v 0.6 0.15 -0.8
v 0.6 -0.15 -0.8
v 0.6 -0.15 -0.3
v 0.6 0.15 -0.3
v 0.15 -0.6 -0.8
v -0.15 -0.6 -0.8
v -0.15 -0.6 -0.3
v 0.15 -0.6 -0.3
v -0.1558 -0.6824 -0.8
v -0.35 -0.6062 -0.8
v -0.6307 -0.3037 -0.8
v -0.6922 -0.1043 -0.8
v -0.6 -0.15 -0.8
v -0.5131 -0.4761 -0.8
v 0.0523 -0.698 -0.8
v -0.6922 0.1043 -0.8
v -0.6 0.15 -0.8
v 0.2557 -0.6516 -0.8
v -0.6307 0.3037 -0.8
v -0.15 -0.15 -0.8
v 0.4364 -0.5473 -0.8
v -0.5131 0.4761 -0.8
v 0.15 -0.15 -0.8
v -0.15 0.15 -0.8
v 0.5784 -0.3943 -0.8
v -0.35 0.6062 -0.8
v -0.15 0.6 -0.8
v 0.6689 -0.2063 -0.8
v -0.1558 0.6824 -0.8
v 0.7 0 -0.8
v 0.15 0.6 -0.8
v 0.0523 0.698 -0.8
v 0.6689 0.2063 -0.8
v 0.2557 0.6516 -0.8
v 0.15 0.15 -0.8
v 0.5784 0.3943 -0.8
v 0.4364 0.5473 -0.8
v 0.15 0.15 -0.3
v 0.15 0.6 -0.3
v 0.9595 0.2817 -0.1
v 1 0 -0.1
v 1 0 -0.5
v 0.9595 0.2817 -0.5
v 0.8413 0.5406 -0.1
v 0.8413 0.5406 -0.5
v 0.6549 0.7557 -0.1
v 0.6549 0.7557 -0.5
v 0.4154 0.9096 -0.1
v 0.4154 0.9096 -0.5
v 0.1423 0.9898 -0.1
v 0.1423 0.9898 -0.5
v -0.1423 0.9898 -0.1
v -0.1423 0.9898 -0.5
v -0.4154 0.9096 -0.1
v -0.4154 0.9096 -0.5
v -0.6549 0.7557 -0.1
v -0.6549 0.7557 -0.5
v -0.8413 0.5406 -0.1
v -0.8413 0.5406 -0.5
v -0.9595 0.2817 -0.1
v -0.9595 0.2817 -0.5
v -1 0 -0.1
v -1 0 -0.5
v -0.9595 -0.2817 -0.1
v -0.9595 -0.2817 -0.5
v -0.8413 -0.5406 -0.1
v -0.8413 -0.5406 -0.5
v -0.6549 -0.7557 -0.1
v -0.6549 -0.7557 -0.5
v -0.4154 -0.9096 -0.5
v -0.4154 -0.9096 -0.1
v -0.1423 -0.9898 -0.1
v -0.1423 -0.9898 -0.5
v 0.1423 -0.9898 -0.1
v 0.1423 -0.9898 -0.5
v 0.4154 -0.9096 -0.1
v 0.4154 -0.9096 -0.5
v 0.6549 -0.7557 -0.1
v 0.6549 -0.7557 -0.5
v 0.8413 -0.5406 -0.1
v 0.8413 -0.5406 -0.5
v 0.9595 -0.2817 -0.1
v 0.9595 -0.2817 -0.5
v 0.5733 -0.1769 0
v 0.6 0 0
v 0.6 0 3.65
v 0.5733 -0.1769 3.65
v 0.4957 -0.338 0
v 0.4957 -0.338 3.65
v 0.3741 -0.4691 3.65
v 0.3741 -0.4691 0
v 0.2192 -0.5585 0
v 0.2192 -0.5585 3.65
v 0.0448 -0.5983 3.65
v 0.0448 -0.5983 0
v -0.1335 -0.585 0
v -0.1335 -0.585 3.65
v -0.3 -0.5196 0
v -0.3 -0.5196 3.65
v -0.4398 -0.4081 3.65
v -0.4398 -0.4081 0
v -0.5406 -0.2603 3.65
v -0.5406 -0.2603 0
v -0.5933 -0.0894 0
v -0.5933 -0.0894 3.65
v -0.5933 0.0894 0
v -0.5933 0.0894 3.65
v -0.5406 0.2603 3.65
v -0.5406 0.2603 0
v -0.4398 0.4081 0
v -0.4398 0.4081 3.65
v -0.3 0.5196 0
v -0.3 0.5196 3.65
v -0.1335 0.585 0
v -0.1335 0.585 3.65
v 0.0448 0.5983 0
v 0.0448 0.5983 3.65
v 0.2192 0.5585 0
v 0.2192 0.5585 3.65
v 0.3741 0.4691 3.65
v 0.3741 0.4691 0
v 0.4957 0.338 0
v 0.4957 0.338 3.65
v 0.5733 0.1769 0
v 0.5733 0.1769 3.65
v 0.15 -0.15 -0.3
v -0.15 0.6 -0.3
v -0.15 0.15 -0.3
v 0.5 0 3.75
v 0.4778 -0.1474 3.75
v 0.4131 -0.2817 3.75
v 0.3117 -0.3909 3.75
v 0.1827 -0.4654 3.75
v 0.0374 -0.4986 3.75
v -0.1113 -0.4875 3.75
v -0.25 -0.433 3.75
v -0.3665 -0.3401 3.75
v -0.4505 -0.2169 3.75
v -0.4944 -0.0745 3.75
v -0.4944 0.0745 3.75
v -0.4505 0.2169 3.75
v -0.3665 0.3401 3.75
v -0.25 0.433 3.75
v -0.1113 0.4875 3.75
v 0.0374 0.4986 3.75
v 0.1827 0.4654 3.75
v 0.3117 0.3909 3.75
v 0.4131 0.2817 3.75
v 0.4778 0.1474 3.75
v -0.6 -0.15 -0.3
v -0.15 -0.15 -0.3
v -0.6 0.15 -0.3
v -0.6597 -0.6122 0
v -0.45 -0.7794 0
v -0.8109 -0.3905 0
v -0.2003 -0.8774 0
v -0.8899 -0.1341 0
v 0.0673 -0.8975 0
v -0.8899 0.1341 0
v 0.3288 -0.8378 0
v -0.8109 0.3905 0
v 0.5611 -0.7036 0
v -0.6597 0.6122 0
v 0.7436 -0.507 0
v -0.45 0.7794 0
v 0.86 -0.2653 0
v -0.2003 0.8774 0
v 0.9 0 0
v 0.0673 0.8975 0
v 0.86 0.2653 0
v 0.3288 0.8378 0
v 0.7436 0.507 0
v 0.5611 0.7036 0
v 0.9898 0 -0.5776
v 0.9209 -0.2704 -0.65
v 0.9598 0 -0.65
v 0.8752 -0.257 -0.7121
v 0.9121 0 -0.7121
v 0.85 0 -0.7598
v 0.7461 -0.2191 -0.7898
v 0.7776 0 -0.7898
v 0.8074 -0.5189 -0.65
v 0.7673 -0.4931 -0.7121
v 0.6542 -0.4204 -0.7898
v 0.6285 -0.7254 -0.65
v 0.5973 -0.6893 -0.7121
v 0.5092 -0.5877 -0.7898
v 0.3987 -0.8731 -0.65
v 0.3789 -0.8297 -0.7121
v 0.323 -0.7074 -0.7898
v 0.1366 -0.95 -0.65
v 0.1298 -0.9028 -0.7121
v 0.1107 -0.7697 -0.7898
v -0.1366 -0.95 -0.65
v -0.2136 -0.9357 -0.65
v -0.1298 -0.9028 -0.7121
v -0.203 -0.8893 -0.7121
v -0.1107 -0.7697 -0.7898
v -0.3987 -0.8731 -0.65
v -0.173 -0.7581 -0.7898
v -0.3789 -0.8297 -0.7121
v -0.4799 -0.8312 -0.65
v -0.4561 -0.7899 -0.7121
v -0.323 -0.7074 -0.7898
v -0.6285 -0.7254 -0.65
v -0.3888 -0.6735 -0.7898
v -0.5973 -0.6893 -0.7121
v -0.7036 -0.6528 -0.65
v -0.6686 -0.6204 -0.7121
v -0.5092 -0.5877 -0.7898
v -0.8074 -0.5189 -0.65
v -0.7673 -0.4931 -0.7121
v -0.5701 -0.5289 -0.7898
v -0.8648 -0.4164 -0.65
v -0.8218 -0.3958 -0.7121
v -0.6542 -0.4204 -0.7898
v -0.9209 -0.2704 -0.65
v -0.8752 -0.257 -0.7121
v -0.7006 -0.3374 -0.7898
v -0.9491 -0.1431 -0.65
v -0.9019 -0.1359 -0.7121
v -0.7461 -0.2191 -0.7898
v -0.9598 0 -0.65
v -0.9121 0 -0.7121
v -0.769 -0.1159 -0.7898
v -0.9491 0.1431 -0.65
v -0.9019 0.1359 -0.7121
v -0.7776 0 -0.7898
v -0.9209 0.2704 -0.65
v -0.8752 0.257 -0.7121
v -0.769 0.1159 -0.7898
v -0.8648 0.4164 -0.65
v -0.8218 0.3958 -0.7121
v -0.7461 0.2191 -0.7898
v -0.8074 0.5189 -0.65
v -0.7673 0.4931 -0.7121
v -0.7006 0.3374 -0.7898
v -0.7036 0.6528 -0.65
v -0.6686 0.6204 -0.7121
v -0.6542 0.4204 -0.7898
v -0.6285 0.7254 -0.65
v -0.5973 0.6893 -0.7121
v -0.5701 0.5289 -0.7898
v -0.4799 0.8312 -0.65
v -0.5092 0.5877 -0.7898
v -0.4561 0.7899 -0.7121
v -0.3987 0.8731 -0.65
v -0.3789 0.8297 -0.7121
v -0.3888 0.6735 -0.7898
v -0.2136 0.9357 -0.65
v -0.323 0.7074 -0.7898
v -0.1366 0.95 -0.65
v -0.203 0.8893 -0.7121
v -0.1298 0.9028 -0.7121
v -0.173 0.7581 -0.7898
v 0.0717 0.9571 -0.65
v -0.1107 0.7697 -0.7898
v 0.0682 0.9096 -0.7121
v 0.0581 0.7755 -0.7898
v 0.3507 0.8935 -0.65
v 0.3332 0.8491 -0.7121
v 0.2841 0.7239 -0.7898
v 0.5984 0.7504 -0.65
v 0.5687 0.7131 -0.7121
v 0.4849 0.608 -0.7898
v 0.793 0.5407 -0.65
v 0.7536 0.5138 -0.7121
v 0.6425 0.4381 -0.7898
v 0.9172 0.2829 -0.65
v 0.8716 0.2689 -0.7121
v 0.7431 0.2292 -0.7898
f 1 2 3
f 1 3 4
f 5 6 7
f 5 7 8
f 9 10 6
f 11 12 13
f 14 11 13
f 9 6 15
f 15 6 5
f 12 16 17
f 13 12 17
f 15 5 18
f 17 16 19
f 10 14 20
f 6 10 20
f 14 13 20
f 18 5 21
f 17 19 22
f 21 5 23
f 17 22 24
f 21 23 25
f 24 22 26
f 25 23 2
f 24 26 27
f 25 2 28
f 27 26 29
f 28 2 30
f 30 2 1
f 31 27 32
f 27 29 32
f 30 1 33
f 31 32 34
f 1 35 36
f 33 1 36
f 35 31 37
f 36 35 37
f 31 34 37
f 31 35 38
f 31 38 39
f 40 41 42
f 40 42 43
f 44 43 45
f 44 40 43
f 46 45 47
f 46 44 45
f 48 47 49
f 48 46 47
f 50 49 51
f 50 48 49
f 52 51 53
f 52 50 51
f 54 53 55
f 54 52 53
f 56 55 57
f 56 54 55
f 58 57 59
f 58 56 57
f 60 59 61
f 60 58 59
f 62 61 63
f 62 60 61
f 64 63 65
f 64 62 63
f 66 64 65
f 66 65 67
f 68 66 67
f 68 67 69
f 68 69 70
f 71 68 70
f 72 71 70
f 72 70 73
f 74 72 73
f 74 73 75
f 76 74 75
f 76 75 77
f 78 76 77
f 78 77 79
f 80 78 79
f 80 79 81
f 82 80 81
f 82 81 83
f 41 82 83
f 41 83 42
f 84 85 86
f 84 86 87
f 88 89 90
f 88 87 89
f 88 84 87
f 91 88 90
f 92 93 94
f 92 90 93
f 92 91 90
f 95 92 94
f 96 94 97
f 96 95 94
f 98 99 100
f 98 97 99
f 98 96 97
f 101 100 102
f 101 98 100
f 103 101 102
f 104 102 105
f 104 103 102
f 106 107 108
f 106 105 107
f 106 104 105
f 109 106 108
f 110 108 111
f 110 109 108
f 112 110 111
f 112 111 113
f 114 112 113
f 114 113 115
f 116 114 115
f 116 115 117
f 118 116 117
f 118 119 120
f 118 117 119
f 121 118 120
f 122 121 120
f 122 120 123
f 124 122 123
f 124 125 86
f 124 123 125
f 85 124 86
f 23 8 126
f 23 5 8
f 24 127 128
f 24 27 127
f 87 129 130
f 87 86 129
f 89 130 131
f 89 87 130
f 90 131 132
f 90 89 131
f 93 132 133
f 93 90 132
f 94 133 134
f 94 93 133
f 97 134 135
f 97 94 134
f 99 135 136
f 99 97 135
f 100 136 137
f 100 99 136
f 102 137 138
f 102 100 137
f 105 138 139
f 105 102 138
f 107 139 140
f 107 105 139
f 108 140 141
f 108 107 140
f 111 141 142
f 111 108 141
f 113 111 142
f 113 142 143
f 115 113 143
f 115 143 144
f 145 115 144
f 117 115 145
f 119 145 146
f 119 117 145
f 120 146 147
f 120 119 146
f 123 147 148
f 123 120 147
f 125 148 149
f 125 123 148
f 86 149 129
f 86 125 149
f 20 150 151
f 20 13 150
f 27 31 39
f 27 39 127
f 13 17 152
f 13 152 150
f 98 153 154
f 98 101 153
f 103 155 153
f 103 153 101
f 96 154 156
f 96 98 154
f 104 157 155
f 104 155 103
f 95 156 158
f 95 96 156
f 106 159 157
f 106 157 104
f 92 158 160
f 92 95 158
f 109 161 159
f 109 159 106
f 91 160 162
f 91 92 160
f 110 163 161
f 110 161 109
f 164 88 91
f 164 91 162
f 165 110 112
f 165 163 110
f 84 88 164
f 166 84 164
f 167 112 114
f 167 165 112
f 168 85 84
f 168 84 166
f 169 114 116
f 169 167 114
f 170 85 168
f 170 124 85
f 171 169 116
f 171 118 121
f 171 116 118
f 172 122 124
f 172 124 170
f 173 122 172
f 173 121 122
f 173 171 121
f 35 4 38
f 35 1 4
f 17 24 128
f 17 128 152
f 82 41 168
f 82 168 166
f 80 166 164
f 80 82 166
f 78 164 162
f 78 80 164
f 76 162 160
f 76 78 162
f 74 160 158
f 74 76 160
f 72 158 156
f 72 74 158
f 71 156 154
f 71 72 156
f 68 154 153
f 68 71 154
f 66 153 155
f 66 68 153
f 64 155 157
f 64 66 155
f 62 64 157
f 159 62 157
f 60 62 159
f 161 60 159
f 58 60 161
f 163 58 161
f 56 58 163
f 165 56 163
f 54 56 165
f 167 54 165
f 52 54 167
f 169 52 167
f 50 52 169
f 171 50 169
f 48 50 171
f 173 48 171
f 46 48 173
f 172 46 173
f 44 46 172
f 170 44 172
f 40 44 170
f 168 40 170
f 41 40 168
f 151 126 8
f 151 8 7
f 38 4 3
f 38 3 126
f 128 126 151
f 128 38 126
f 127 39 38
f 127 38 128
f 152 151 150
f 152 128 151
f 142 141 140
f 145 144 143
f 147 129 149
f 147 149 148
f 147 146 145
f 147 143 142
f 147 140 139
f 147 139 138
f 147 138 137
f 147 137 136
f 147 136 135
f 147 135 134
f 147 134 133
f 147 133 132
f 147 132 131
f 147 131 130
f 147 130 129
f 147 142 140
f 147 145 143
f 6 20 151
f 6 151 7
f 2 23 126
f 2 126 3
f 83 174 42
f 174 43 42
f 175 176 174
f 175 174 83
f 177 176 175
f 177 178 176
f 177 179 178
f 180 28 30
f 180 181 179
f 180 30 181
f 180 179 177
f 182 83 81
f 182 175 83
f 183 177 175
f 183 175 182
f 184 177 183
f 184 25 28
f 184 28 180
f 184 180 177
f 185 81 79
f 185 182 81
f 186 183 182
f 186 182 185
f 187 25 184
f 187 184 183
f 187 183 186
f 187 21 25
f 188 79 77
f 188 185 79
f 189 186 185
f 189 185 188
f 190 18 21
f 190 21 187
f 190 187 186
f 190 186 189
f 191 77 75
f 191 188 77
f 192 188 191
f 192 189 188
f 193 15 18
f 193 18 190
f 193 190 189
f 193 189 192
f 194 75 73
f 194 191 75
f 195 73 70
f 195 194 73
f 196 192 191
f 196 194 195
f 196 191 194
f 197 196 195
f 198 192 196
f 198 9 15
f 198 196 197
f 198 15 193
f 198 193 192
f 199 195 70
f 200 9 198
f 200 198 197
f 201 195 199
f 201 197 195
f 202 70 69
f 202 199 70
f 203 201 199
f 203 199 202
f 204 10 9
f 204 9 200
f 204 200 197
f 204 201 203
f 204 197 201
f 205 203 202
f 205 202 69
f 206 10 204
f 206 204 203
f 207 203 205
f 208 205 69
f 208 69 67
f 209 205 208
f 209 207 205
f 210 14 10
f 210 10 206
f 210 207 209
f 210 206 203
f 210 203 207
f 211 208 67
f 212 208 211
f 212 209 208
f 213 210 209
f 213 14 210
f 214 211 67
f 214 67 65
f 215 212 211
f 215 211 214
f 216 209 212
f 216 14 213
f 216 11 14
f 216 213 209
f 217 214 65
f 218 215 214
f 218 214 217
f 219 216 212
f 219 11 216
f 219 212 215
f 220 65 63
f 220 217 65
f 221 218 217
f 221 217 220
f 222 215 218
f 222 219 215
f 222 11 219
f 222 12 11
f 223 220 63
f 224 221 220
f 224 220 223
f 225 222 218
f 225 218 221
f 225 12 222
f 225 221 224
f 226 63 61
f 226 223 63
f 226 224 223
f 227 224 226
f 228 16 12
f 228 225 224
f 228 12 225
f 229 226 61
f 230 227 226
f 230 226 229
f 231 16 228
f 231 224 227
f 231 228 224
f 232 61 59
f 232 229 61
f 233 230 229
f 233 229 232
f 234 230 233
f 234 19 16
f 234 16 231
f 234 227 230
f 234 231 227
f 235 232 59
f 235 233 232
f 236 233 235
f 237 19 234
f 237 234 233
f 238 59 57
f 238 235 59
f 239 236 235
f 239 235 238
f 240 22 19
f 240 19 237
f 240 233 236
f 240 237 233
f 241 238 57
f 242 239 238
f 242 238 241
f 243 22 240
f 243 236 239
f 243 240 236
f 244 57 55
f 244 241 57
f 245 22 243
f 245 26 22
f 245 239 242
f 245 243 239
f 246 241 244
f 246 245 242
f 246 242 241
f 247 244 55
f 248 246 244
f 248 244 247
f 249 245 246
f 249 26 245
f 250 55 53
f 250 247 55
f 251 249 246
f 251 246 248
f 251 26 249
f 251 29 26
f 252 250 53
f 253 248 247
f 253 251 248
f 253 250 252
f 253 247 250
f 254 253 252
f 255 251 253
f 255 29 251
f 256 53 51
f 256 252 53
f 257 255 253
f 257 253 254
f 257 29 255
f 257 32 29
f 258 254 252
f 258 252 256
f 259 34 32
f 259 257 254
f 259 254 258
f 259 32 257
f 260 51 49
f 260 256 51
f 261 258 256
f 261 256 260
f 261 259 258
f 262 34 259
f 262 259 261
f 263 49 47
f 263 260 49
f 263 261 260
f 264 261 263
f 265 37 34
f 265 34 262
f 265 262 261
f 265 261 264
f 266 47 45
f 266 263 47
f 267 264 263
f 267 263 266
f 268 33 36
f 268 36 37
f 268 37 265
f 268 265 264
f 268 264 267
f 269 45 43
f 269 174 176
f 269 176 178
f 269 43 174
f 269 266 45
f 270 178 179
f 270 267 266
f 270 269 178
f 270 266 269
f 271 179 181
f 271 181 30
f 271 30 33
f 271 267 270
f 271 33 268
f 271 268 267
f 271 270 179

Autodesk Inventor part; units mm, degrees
ref_plane "YZ Plane" through (0, 0, 0) normal (1, 0, 0) x (0, 1, 0)
ref_plane "XZ Plane" through (0, 0, 0) normal (0, 1, 0) x (-1, 0, 0)
ref_plane "XY Plane" through (0, 0, 0) normal (0, 0, 1) x (1, 0, 0)
sketch "Sketch1" plane through (0, 0, 0) normal (0, 0, 1) x (1, 0, 0)
  circle A0 centre (0, 0) radius 1
  dimension "d0" = 2
extrude "Extrusion1" add sketch "Sketch1" against normal blind 0.8
sketch "Sketch2" plane through (0, 0, 0) normal (0, 0, 1) x (1, 0, 0)
  circle A0 centre (0, 0) radius 1 projected
  circle A1 centre (0, 0) radius 0.6
  dimension "d3" = 1.2
extrude "Extrusion2" add sketch "Sketch2" along normal blind 3.75 contours A1
fillet "Fillet1" radius 0.3 1 edges at (-1, 0, -0.8)
chamfer "Chamfer1" distance 0.1 angle 45 2 edges at (-1, 0, 0) (-0.6, 0, 3.75)
sketch "Sketch3" plane through (0, 0, -0.8) normal (0, 0, -1) x (-1, 0, 0)
  line L0 (-0.15, 0.15) -> (-0.15, 0.6)
  line L1 (-0.15, 0.6) -> (0.15, 0.6)
  line L2 (0.15, 0.6) -> (0.15, 0.15)
  line L3 (0.15, 0.15) -> (0.6, 0.15)
  line L4 (0.6, 0.15) -> (0.6, -0.15)
  line L5 (0.6, -0.15) -> (0.15, -0.15)
  line L6 (0.15, -0.15) -> (0.15, -0.6)
  line L7 (0.15, -0.6) -> (-0.15, -0.6)
  line L8 (-0.15, -0.6) -> (-0.15, -0.15)
  line L9 (-0.15, -0.15) -> (-0.6, -0.15)
  line L10 (-0.6, -0.15) -> (-0.6, 0.15)
  line L11 (-0.6, 0.15) -> (-0.15, 0.15)
  line L12 (1.4, 0) -> (-1.4, 0) construction
  line L13 (0, -1.4) -> (0, 1.4) construction
  point P0 (0, 0)
  dimension "d10" = 1.2
  dimension "d11" = 0.3
extrude "Extrusion3" cut sketch "Sketch3" against normal blind 0.5
properties part number "pan_head_screw_M1.2x4" material "Nickel-Copper Alloy 400"
